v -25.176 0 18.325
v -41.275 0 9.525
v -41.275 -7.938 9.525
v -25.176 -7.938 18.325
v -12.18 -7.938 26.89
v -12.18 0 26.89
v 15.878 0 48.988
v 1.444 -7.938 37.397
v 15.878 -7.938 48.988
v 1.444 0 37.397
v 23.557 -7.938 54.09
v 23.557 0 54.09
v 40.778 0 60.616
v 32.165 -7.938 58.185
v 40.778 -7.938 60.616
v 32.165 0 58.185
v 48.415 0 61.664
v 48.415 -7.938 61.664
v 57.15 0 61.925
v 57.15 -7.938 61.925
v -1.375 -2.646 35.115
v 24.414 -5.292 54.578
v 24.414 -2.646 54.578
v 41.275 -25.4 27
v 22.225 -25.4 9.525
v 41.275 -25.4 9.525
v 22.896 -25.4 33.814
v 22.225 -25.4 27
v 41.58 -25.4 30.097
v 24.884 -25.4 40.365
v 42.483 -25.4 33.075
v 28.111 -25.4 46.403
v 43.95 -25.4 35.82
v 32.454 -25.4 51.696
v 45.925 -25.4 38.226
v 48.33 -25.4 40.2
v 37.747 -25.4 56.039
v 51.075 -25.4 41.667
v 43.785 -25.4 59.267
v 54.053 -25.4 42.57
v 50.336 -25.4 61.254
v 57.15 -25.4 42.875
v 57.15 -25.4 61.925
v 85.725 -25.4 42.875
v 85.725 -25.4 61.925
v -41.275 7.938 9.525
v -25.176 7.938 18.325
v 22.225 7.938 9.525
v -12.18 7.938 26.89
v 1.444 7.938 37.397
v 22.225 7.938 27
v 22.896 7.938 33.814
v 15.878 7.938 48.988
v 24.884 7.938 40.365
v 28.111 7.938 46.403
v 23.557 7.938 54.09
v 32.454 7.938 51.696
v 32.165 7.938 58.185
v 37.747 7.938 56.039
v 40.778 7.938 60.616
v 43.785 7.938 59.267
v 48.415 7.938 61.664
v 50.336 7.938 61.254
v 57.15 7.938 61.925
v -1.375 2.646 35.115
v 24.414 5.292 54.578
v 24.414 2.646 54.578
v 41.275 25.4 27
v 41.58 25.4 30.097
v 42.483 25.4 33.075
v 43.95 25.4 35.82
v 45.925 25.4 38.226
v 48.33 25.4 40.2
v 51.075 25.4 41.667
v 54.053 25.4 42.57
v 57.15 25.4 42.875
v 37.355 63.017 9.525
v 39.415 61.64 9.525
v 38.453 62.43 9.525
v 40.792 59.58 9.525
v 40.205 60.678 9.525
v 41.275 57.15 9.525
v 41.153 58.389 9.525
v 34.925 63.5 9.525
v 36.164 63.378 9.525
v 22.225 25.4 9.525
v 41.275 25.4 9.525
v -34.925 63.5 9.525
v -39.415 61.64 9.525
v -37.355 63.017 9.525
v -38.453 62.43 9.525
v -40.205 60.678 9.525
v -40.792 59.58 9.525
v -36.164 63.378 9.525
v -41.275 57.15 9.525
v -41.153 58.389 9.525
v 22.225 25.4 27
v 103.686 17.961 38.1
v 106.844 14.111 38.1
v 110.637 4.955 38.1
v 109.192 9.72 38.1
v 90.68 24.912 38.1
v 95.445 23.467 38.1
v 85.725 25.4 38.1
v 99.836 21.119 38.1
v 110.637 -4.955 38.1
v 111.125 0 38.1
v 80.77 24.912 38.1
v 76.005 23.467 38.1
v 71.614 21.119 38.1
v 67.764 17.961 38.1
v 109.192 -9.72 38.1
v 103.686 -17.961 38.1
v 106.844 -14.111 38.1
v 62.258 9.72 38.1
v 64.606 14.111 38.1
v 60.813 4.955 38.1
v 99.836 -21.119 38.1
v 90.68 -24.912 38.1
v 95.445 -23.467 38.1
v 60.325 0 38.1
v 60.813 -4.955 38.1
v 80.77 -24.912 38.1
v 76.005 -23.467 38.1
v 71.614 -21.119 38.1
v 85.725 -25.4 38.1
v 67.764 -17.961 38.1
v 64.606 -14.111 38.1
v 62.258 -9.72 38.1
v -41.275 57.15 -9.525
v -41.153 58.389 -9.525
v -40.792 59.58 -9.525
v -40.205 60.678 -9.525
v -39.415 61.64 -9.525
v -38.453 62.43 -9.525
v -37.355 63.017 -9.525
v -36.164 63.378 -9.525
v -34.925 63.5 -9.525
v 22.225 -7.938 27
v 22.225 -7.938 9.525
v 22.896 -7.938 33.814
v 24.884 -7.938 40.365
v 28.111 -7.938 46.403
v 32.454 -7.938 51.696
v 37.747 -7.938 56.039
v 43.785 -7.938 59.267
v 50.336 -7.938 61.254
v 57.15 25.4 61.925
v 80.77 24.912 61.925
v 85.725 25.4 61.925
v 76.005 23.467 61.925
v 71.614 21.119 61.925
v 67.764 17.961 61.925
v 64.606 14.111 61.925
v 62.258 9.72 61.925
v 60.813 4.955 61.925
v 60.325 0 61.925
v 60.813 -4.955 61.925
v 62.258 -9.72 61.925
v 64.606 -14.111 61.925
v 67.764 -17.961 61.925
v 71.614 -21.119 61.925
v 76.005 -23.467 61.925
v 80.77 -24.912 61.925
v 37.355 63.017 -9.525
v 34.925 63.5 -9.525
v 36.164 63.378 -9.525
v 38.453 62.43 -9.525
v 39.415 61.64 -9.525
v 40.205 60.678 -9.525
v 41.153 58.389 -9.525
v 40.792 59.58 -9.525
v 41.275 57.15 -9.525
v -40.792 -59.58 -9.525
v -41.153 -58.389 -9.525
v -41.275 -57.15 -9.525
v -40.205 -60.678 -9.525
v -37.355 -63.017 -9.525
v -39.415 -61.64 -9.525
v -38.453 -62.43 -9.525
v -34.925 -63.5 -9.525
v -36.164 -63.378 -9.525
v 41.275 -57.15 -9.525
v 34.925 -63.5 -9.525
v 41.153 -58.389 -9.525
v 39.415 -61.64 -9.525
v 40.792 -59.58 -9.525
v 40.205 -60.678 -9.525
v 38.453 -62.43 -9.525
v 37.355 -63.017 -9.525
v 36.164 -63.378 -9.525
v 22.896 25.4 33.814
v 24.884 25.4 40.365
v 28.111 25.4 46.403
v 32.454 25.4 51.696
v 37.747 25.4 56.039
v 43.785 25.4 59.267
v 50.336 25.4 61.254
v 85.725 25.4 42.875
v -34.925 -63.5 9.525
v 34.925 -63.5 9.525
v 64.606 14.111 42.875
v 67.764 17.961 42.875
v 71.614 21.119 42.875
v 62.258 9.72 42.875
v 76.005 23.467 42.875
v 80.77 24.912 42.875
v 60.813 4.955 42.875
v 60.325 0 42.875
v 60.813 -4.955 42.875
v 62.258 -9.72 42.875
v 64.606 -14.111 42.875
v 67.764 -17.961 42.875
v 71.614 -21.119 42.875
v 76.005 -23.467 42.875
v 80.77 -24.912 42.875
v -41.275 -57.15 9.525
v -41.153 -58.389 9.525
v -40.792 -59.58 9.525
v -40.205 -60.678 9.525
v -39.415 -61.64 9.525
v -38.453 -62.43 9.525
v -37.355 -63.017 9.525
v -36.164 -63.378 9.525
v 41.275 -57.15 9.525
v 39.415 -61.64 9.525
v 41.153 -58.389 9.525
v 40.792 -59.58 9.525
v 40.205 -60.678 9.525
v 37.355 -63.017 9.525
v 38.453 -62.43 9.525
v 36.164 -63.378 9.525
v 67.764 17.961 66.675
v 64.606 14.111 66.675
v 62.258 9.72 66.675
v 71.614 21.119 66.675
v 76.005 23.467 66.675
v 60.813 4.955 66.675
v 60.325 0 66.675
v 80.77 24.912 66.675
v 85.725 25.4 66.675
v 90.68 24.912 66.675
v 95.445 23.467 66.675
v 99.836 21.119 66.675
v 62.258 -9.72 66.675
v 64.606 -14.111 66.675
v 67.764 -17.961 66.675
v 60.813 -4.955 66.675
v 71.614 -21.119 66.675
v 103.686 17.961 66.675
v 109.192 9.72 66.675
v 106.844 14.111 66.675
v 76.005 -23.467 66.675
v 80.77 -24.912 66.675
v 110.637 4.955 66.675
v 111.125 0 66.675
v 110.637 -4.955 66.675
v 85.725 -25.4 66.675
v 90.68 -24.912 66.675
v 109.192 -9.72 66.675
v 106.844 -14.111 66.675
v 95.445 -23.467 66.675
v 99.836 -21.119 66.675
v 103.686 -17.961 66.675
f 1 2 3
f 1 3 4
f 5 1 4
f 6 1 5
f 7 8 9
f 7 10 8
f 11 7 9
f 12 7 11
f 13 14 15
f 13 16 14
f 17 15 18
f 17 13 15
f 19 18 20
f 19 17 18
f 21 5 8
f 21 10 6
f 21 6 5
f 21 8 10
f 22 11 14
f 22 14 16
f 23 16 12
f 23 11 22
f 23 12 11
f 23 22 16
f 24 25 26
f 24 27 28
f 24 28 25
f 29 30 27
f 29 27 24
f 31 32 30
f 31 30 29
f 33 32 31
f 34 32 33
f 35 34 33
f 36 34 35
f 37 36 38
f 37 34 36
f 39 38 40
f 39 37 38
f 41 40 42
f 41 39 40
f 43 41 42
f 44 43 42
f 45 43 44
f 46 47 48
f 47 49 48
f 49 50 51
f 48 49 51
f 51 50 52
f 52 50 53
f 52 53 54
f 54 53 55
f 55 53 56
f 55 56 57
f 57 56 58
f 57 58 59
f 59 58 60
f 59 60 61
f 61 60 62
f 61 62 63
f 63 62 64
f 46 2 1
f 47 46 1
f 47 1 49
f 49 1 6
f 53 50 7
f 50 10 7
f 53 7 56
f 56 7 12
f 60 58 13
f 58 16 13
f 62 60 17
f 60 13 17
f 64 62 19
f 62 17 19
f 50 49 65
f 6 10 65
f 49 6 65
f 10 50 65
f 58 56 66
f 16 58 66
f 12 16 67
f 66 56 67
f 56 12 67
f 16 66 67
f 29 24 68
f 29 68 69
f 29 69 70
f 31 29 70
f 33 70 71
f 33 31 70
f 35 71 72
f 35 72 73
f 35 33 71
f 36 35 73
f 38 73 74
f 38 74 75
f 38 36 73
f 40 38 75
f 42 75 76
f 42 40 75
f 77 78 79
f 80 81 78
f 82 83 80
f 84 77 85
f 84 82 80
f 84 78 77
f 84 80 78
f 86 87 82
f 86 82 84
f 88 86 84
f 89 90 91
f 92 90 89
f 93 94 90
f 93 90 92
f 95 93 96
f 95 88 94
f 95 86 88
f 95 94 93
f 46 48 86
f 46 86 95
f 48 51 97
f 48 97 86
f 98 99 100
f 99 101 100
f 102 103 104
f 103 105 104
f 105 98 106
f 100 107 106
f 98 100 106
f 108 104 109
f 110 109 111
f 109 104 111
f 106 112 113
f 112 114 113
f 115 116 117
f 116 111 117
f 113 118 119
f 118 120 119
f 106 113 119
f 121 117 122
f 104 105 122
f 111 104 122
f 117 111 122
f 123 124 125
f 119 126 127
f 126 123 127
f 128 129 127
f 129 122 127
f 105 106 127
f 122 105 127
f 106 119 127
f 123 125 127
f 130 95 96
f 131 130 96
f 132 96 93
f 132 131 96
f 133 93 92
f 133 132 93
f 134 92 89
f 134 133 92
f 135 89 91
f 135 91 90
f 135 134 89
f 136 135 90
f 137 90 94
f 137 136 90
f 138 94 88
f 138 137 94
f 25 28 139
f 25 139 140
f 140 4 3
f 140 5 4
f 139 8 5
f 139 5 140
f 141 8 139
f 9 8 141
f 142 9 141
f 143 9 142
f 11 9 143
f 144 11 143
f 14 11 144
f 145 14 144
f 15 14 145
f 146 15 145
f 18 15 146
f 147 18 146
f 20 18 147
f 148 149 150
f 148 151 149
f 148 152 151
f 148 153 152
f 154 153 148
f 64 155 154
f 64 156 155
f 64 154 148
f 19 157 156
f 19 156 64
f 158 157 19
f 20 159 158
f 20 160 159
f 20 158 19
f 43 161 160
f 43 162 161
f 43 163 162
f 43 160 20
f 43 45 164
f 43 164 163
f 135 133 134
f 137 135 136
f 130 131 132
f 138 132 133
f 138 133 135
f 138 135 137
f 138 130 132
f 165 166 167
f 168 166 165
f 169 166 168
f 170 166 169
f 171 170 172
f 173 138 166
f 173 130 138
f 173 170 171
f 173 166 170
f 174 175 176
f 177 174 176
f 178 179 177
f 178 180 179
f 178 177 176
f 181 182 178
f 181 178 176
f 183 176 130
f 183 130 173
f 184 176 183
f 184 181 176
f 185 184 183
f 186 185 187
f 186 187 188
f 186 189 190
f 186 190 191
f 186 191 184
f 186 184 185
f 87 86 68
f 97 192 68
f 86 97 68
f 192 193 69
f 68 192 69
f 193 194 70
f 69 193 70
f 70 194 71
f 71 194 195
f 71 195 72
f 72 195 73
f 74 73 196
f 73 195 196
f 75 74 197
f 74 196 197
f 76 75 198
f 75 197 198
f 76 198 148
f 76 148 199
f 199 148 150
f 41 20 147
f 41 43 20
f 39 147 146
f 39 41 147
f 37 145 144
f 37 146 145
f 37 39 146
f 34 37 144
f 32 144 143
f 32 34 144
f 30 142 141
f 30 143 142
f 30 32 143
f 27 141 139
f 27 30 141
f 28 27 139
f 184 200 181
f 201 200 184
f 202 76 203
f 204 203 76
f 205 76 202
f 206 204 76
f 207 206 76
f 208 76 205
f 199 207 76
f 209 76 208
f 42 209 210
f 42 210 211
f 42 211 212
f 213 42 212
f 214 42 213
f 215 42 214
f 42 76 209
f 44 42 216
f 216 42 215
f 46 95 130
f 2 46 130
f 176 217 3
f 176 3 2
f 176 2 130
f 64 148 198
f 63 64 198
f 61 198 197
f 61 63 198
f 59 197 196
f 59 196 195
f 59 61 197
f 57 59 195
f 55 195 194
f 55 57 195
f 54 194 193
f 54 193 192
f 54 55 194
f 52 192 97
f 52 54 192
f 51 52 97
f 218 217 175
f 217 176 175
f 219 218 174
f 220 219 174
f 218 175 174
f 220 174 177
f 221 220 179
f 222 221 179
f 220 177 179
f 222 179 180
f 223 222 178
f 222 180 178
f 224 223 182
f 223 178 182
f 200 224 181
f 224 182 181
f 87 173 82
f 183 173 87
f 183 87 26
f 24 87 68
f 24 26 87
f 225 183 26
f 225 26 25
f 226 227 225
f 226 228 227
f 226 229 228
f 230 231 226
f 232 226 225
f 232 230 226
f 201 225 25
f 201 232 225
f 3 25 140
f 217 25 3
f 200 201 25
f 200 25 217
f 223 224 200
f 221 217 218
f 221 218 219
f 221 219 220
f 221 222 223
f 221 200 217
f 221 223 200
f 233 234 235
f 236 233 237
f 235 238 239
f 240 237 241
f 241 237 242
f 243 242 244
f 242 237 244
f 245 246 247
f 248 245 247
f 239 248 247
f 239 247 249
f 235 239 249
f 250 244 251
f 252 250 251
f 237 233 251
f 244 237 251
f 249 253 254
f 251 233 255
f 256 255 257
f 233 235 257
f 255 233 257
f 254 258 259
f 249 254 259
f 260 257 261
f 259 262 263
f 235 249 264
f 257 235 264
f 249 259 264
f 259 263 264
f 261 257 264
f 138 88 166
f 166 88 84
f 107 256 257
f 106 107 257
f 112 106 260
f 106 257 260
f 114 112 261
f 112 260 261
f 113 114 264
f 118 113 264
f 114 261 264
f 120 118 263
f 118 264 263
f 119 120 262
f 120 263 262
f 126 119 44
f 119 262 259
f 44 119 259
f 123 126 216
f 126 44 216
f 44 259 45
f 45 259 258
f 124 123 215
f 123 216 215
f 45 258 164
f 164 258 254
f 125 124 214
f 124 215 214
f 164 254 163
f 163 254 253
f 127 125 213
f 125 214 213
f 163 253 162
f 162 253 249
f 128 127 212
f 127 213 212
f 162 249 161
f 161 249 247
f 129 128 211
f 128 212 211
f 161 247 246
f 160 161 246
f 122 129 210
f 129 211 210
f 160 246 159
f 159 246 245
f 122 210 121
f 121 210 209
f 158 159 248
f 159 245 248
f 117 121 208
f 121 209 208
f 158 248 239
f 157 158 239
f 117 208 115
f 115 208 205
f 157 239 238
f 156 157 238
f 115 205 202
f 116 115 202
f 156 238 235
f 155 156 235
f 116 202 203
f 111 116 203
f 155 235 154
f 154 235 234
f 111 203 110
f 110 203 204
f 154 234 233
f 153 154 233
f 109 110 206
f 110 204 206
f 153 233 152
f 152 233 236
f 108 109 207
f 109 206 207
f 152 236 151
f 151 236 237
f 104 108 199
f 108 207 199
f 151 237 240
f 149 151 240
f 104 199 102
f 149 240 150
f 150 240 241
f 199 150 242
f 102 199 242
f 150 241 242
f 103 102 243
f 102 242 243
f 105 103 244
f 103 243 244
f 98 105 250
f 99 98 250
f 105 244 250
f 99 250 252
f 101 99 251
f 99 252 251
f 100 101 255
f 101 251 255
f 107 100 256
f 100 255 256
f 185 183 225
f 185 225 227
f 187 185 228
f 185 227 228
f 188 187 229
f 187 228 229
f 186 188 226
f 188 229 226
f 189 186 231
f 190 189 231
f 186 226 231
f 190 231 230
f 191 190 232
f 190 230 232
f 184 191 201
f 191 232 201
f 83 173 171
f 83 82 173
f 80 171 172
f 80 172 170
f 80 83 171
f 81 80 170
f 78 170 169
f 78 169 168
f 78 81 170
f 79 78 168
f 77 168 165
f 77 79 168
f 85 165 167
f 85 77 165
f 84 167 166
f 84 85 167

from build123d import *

# Parameters (mm, degrees)
F1_DEPTH = 63.5
F0_W     = 25.4
F0_H     = 19.05
F2_DEPTH = 25.4
F3_DEPTH = 7.9375
F5_R     = 6.35


with BuildPart() as f1:
    # F0 (on Front) → F1 (new body, symmetric)
    with BuildSketch(Plane.XZ):
        Polygon((41.275, 8.7261183647), (41.275, 9.525), (22.225, 9.525), (-41.275, 9.525), (-41.275, -9.525), (41.275, -9.525), align=None)
    extrude(amount=F1_DEPTH, both=True)

    # F0 (on Front) → F2 (join, symmetric)
    with BuildSketch(Plane.XZ):
        with BuildLine():
            Line((22.225, 9.525), (41.275, 9.525))
            Line((41.275, 9.525), (41.275, 27.0002))
            ThreePointArc((41.275, 27.0002), (45.9246798487, 38.2255201513), (57.15, 42.8752))
            Line((57.15, 42.8752), (60.325, 42.8752))
            Line((60.325, 42.8752), (60.325, 61.9252))
            Line((60.325, 61.9252), (57.15, 61.9252))
            ThreePointArc((57.15, 61.9252), (32.4542956671, 51.6959043329), (22.225, 27.0002))
            Line((22.225, 27.0002), (22.225, 9.525))
        make_face()
        with Locations((73.025, 52.4002)):
            Rectangle(F0_W, F0_H)
    extrude(amount=F2_DEPTH, both=True)

    # F0 (on Front) → F3 (join, symmetric)
    with BuildSketch(Plane.XZ):
        with BuildLine():
            Line((-41.275, 9.525), (22.225, 9.525))
            Line((22.225, 9.525), (22.225, 27.0002))
            ThreePointArc((22.225, 27.0002), (32.4542956671, 51.6959043329), (57.15, 61.9252))
            add(Edge.make_bspline(
                [(-41.275, 9.525), (12.6994326711, 36.1836515367), (13.9212344627, 62.6314580441), (57.15, 61.9252)],
                knots=[0, 0, 0, 0, 111.5045361635, 111.5045361635, 111.5045361635, 111.5045361635], degree=3))
        make_face()
    extrude(amount=F3_DEPTH, both=True)

    # F0 (on Front) → F4 (revolve)
    with BuildSketch(Plane.XZ):
        Polygon((85.725, 61.9252), (85.725, 42.8752), (85.725, 38.1), (111.125, 38.1), (111.125, 66.675), (85.725, 66.675), align=None)
    revolve(axis=Axis((85.725, 0, 52.3875), (0, 0, -1)))

    # F5
    f5_edges = [f1.edges().sort_by_distance(p)[0] for p in [
        (41.275, -63.5, 0),
        (-41.275, -63.5, 0),
        (-41.275, 63.5, 0),
        (41.275, 63.5, 0),
    ]]
    fillet(f5_edges, radius=F5_R)


solid = f1.part
